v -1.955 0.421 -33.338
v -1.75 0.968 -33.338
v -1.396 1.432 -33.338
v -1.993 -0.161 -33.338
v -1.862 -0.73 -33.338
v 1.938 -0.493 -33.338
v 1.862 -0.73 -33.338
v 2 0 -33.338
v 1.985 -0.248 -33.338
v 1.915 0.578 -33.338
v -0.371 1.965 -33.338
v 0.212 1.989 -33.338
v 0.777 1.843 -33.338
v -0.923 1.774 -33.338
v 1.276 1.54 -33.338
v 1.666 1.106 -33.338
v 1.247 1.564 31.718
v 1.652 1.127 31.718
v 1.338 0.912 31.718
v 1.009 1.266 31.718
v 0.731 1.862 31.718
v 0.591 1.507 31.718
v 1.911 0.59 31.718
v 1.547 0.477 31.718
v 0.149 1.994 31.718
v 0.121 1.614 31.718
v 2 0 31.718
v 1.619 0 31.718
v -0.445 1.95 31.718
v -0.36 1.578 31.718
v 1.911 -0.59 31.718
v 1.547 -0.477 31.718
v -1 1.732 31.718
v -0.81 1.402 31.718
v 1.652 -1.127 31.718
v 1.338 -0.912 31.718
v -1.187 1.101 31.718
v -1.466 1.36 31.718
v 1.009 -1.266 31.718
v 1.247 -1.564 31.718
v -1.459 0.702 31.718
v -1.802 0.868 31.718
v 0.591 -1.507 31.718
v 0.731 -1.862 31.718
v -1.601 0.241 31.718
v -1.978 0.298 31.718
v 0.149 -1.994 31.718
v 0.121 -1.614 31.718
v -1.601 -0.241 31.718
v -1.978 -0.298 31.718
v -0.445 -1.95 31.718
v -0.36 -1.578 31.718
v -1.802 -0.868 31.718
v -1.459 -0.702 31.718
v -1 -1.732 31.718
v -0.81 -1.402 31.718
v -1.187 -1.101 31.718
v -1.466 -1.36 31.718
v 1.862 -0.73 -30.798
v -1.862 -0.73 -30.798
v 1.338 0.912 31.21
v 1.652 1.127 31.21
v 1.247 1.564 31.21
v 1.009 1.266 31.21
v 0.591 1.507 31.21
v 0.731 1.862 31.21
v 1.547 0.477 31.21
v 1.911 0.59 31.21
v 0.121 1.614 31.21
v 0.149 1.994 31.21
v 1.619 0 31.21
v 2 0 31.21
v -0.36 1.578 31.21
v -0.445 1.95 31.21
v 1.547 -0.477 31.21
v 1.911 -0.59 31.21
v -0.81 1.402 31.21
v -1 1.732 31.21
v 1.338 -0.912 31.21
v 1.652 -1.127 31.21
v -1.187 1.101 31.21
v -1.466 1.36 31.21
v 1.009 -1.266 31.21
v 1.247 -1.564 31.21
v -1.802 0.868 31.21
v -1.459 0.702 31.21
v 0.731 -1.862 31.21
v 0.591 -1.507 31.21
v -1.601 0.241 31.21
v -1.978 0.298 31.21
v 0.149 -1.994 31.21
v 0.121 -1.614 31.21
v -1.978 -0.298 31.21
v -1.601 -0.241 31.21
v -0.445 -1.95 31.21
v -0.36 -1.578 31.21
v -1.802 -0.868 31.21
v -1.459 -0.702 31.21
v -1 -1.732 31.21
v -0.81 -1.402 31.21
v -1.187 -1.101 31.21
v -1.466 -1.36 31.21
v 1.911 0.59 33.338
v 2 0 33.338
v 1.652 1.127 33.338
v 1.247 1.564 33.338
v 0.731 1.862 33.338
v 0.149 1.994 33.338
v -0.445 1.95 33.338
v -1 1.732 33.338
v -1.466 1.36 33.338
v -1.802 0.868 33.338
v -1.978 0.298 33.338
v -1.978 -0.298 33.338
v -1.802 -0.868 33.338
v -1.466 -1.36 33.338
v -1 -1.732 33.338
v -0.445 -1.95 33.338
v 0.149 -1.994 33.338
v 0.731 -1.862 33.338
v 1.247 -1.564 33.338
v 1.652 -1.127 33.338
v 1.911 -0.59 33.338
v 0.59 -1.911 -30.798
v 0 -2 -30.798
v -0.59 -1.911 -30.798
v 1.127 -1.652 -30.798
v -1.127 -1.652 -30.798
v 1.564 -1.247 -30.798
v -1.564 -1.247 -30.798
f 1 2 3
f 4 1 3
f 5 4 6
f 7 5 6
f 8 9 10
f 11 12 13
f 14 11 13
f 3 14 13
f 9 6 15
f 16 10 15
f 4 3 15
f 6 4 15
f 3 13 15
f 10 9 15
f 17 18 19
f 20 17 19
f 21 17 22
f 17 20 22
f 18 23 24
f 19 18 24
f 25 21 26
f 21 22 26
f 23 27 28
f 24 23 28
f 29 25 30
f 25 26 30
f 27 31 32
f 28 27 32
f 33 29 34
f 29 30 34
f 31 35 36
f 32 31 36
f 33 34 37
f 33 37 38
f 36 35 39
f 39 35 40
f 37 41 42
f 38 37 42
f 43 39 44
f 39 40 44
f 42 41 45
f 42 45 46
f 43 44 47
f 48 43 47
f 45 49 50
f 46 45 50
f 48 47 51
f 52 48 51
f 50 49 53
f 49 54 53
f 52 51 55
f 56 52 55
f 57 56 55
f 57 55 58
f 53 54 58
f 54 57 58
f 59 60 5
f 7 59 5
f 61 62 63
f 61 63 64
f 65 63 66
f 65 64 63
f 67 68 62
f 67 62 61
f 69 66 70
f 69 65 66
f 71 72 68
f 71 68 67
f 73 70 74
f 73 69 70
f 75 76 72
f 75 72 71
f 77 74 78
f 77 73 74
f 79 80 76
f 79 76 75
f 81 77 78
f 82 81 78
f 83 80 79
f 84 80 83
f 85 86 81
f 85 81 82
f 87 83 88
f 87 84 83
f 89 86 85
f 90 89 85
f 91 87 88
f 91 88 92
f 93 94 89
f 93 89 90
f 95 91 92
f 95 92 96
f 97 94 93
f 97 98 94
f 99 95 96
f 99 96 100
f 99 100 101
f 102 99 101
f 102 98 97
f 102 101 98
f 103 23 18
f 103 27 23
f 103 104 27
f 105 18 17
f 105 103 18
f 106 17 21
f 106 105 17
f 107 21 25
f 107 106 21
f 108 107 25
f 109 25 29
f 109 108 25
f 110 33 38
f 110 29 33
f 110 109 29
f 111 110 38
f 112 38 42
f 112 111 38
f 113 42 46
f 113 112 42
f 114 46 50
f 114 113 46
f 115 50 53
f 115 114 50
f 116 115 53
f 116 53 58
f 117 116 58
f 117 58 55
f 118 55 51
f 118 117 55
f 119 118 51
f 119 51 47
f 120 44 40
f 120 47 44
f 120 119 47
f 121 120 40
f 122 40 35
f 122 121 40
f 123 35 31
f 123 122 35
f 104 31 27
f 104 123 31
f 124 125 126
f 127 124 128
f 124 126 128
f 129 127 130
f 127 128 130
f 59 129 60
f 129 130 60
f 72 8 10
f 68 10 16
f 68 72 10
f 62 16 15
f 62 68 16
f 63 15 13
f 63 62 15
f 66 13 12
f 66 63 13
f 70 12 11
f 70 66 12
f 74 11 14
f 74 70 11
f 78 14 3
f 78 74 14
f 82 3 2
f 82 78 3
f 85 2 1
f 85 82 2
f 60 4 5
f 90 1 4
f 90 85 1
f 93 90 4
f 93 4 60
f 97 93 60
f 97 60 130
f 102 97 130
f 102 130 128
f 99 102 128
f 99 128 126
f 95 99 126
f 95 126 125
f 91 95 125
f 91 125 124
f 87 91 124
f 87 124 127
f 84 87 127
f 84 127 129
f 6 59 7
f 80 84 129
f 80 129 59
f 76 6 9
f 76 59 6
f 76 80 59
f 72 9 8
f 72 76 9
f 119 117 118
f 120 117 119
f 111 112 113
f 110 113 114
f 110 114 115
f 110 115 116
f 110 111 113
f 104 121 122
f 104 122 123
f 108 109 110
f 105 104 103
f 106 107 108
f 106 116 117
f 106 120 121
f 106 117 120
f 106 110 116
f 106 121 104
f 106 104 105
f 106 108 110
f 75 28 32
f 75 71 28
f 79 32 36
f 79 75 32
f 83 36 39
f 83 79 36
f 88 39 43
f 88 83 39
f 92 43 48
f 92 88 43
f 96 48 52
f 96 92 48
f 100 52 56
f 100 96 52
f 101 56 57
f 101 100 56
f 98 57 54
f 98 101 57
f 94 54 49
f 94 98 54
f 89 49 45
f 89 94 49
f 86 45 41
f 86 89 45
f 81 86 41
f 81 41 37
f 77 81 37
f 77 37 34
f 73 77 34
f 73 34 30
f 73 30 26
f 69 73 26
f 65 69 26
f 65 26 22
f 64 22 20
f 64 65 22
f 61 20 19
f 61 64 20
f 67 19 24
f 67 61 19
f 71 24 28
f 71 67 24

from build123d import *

# Parameters (mm, degrees)
SKETCH1_R               = 2
BOSS_EXTRUDE1_DEPTH     = 33.3375
SKETCH2_W               = 0.508
SKETCH2_H               = 0.381
CUT_EXTRUDE1_DEPTH      = 34.457269856
CUT_EXTRUDE1_DEPTH_BACK = 34.457269856
SKETCH3_W               = 2.54
SKETCH3_H               = 1.27


with BuildPart() as part:
    # Sketch1 → Boss-Extrude1 (new, symmetric)
    with BuildSketch(Plane.XY):
        Circle(SKETCH1_R)
    extrude(amount=BOSS_EXTRUDE1_DEPTH, both=True)

    # Sketch2 → Cut-Revolve1 (revolve, cut)
    with BuildSketch(Plane(origin=(0, 0, 0), x_dir=(0, 0, -1), z_dir=(1, 0, 0)), mode=Mode.PRIVATE) as cut_revolve1_sk:
        with Locations((-31.46425, 1.8095)):
            Rectangle(SKETCH2_W, SKETCH2_H)
    revolve(cut_revolve1_sk.sketch.rotate(Axis((0, 0, 33.3375), (0, 0, -1)), 90), axis=Axis((0, 0, 33.3375), (0, 0, -1)), mode=Mode.SUBTRACT)

    # Sketch3 → Cut-Extrude1 (cut, two sides: drawn at the far end of the back side and taken through both)
    with BuildSketch(Plane(origin=(0, 0, 0), x_dir=(0, 0, -1), z_dir=(1, 0, 0)).offset(-CUT_EXTRUDE1_DEPTH_BACK)):
        with Locations((32.0675, -1.365)):
            Rectangle(SKETCH3_W, SKETCH3_H)
    extrude(amount=CUT_EXTRUDE1_DEPTH + CUT_EXTRUDE1_DEPTH_BACK, mode=Mode.SUBTRACT)


solid = part.part
